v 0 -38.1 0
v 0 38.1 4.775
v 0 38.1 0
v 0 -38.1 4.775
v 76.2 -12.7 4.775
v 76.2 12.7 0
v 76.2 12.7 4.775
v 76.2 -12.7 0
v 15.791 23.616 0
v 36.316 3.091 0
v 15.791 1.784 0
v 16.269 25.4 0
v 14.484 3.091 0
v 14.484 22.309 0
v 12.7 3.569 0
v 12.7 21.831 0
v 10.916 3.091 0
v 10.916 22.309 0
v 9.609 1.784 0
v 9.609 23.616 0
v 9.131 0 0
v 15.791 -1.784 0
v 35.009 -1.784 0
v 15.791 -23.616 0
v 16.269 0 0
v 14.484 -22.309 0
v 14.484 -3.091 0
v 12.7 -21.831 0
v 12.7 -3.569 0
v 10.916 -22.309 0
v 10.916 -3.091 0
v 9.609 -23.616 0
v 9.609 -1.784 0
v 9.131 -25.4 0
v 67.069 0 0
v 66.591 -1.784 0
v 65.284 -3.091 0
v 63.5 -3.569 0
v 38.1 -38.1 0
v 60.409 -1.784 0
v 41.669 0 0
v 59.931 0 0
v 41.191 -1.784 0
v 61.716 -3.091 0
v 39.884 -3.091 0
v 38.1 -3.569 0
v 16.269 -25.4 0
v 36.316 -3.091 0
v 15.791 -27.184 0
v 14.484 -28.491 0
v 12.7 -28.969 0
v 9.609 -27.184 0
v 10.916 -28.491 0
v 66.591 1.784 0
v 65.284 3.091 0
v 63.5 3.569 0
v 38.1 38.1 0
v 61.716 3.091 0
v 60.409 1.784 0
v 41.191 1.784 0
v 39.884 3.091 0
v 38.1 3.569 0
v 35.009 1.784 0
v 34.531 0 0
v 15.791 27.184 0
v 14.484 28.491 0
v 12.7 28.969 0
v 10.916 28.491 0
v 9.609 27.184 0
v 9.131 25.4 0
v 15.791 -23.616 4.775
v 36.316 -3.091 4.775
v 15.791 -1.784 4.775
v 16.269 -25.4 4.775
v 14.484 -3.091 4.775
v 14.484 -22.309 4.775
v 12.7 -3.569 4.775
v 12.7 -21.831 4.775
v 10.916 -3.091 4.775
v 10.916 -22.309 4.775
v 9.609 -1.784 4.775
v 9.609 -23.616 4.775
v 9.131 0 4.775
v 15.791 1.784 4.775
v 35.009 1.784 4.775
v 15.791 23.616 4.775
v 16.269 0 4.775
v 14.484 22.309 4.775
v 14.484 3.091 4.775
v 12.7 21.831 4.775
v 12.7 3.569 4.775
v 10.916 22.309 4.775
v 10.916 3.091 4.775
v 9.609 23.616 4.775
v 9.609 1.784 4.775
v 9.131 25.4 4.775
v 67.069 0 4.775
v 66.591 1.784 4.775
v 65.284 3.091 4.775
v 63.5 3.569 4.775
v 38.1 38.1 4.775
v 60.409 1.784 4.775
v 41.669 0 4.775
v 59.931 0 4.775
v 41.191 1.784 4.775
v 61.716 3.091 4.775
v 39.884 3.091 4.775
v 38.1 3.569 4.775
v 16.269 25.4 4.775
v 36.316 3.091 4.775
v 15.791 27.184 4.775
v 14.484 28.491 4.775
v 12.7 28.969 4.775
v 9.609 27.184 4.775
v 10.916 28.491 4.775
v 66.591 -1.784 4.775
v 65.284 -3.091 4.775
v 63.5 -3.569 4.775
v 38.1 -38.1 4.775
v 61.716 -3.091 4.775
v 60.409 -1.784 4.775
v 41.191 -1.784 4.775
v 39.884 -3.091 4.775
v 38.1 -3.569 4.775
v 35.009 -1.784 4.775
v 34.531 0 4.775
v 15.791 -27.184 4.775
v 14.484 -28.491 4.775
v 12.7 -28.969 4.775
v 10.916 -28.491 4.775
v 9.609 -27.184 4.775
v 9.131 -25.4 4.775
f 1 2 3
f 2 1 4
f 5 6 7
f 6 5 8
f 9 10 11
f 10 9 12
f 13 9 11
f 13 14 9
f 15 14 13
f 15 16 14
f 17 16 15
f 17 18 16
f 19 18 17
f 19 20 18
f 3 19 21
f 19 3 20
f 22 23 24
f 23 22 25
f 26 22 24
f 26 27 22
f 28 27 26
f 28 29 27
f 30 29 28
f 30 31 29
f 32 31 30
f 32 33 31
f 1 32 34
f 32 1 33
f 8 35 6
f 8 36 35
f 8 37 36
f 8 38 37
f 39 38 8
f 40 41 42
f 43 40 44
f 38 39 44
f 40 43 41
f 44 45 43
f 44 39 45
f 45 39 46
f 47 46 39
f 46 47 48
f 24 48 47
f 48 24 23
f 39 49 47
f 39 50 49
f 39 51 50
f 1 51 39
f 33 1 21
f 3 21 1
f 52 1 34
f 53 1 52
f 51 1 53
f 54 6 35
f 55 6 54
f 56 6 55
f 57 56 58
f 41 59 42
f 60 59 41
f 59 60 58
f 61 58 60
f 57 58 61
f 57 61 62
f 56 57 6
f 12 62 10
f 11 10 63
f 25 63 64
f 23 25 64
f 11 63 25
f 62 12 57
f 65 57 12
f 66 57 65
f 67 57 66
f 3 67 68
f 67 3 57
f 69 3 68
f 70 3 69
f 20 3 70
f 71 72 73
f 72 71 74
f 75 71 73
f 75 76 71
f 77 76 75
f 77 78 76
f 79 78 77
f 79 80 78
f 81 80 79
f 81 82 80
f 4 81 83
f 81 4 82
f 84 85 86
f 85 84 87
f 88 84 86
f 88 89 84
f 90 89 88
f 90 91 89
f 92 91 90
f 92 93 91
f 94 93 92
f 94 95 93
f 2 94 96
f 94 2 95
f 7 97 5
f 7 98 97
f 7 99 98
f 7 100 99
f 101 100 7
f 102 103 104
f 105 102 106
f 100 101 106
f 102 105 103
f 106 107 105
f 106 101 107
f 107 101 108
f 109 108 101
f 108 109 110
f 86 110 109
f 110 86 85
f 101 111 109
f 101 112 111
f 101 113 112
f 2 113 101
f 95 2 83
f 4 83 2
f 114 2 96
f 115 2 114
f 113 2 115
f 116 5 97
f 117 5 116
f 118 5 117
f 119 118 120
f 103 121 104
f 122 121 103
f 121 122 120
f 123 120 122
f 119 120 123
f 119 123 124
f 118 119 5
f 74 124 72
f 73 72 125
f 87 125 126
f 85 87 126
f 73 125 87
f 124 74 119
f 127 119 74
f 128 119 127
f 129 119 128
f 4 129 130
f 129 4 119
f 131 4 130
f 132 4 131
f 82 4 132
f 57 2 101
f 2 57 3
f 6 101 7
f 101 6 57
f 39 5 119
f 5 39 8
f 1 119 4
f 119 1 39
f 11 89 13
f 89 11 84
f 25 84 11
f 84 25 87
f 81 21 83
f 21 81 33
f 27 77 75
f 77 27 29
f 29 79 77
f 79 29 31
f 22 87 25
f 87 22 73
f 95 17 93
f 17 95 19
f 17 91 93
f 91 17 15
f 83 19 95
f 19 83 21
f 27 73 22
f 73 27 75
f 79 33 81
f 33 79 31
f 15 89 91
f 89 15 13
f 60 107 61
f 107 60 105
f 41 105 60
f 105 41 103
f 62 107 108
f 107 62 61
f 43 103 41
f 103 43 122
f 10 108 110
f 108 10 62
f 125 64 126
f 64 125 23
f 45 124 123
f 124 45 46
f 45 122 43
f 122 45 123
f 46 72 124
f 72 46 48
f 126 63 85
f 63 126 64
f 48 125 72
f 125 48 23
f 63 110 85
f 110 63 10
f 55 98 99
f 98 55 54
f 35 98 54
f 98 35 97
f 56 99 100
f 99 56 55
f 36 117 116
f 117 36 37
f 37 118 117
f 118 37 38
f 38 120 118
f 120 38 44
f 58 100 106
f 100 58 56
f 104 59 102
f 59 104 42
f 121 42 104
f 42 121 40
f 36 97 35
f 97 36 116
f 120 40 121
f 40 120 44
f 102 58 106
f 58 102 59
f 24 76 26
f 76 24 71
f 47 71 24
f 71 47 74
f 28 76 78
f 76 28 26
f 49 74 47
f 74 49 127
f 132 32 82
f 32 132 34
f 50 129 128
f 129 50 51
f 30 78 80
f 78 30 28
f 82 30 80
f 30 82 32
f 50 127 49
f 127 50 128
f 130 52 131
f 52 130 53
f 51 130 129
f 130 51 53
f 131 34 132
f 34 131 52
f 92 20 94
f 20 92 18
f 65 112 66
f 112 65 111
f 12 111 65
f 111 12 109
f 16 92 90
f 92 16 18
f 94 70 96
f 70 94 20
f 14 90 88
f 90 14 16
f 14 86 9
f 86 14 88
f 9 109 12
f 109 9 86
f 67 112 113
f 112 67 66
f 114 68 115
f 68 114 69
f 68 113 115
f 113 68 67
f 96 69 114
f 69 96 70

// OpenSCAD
// file: Library.scad
/*
 * Generic modules for manipulating objects
 */

module mirror_copy(vec=[0,1,0]) { 
    children(); 
    mirror(vec) children(); 
}

module move(x=0, y=0, z=0) {
    translate([x, y, z]) children();
}
// main file
/*
function x(a) = 10 * sin(a);
function y(a) = 30 * cos(a);
points = [ for (a = [0 : 5 : 359]) [ x(a), y(a) ] ];
//echo(points);
//polygon(points);

p = [ for (x = [0:5]) for (y = [0:6]) [y,x]];
echo (p);
polygon(p);
*/

use <Library.scad>;

module teeJoiningPlate() {
    inch = 25.4;
    p2 = [[0,0],[0,1.5*inch],[1.5*inch,1.5*inch],[3*inch,.5*inch], [3*inch,0]];

    difference() {
        mirror_copy() linear_extrude(height=.188*inch) polygon(p2);
        for (x = [.5,1.5,2.5])
            translate([x*inch,0,0]) cylinder(d=.281*inch, h=inch, center=true);
        for (y = [-1,1])
            translate([.5*inch,y*inch,0]) cylinder(d=.281*inch, h=inch, center=true);
    }
}

teeJoiningPlate();
